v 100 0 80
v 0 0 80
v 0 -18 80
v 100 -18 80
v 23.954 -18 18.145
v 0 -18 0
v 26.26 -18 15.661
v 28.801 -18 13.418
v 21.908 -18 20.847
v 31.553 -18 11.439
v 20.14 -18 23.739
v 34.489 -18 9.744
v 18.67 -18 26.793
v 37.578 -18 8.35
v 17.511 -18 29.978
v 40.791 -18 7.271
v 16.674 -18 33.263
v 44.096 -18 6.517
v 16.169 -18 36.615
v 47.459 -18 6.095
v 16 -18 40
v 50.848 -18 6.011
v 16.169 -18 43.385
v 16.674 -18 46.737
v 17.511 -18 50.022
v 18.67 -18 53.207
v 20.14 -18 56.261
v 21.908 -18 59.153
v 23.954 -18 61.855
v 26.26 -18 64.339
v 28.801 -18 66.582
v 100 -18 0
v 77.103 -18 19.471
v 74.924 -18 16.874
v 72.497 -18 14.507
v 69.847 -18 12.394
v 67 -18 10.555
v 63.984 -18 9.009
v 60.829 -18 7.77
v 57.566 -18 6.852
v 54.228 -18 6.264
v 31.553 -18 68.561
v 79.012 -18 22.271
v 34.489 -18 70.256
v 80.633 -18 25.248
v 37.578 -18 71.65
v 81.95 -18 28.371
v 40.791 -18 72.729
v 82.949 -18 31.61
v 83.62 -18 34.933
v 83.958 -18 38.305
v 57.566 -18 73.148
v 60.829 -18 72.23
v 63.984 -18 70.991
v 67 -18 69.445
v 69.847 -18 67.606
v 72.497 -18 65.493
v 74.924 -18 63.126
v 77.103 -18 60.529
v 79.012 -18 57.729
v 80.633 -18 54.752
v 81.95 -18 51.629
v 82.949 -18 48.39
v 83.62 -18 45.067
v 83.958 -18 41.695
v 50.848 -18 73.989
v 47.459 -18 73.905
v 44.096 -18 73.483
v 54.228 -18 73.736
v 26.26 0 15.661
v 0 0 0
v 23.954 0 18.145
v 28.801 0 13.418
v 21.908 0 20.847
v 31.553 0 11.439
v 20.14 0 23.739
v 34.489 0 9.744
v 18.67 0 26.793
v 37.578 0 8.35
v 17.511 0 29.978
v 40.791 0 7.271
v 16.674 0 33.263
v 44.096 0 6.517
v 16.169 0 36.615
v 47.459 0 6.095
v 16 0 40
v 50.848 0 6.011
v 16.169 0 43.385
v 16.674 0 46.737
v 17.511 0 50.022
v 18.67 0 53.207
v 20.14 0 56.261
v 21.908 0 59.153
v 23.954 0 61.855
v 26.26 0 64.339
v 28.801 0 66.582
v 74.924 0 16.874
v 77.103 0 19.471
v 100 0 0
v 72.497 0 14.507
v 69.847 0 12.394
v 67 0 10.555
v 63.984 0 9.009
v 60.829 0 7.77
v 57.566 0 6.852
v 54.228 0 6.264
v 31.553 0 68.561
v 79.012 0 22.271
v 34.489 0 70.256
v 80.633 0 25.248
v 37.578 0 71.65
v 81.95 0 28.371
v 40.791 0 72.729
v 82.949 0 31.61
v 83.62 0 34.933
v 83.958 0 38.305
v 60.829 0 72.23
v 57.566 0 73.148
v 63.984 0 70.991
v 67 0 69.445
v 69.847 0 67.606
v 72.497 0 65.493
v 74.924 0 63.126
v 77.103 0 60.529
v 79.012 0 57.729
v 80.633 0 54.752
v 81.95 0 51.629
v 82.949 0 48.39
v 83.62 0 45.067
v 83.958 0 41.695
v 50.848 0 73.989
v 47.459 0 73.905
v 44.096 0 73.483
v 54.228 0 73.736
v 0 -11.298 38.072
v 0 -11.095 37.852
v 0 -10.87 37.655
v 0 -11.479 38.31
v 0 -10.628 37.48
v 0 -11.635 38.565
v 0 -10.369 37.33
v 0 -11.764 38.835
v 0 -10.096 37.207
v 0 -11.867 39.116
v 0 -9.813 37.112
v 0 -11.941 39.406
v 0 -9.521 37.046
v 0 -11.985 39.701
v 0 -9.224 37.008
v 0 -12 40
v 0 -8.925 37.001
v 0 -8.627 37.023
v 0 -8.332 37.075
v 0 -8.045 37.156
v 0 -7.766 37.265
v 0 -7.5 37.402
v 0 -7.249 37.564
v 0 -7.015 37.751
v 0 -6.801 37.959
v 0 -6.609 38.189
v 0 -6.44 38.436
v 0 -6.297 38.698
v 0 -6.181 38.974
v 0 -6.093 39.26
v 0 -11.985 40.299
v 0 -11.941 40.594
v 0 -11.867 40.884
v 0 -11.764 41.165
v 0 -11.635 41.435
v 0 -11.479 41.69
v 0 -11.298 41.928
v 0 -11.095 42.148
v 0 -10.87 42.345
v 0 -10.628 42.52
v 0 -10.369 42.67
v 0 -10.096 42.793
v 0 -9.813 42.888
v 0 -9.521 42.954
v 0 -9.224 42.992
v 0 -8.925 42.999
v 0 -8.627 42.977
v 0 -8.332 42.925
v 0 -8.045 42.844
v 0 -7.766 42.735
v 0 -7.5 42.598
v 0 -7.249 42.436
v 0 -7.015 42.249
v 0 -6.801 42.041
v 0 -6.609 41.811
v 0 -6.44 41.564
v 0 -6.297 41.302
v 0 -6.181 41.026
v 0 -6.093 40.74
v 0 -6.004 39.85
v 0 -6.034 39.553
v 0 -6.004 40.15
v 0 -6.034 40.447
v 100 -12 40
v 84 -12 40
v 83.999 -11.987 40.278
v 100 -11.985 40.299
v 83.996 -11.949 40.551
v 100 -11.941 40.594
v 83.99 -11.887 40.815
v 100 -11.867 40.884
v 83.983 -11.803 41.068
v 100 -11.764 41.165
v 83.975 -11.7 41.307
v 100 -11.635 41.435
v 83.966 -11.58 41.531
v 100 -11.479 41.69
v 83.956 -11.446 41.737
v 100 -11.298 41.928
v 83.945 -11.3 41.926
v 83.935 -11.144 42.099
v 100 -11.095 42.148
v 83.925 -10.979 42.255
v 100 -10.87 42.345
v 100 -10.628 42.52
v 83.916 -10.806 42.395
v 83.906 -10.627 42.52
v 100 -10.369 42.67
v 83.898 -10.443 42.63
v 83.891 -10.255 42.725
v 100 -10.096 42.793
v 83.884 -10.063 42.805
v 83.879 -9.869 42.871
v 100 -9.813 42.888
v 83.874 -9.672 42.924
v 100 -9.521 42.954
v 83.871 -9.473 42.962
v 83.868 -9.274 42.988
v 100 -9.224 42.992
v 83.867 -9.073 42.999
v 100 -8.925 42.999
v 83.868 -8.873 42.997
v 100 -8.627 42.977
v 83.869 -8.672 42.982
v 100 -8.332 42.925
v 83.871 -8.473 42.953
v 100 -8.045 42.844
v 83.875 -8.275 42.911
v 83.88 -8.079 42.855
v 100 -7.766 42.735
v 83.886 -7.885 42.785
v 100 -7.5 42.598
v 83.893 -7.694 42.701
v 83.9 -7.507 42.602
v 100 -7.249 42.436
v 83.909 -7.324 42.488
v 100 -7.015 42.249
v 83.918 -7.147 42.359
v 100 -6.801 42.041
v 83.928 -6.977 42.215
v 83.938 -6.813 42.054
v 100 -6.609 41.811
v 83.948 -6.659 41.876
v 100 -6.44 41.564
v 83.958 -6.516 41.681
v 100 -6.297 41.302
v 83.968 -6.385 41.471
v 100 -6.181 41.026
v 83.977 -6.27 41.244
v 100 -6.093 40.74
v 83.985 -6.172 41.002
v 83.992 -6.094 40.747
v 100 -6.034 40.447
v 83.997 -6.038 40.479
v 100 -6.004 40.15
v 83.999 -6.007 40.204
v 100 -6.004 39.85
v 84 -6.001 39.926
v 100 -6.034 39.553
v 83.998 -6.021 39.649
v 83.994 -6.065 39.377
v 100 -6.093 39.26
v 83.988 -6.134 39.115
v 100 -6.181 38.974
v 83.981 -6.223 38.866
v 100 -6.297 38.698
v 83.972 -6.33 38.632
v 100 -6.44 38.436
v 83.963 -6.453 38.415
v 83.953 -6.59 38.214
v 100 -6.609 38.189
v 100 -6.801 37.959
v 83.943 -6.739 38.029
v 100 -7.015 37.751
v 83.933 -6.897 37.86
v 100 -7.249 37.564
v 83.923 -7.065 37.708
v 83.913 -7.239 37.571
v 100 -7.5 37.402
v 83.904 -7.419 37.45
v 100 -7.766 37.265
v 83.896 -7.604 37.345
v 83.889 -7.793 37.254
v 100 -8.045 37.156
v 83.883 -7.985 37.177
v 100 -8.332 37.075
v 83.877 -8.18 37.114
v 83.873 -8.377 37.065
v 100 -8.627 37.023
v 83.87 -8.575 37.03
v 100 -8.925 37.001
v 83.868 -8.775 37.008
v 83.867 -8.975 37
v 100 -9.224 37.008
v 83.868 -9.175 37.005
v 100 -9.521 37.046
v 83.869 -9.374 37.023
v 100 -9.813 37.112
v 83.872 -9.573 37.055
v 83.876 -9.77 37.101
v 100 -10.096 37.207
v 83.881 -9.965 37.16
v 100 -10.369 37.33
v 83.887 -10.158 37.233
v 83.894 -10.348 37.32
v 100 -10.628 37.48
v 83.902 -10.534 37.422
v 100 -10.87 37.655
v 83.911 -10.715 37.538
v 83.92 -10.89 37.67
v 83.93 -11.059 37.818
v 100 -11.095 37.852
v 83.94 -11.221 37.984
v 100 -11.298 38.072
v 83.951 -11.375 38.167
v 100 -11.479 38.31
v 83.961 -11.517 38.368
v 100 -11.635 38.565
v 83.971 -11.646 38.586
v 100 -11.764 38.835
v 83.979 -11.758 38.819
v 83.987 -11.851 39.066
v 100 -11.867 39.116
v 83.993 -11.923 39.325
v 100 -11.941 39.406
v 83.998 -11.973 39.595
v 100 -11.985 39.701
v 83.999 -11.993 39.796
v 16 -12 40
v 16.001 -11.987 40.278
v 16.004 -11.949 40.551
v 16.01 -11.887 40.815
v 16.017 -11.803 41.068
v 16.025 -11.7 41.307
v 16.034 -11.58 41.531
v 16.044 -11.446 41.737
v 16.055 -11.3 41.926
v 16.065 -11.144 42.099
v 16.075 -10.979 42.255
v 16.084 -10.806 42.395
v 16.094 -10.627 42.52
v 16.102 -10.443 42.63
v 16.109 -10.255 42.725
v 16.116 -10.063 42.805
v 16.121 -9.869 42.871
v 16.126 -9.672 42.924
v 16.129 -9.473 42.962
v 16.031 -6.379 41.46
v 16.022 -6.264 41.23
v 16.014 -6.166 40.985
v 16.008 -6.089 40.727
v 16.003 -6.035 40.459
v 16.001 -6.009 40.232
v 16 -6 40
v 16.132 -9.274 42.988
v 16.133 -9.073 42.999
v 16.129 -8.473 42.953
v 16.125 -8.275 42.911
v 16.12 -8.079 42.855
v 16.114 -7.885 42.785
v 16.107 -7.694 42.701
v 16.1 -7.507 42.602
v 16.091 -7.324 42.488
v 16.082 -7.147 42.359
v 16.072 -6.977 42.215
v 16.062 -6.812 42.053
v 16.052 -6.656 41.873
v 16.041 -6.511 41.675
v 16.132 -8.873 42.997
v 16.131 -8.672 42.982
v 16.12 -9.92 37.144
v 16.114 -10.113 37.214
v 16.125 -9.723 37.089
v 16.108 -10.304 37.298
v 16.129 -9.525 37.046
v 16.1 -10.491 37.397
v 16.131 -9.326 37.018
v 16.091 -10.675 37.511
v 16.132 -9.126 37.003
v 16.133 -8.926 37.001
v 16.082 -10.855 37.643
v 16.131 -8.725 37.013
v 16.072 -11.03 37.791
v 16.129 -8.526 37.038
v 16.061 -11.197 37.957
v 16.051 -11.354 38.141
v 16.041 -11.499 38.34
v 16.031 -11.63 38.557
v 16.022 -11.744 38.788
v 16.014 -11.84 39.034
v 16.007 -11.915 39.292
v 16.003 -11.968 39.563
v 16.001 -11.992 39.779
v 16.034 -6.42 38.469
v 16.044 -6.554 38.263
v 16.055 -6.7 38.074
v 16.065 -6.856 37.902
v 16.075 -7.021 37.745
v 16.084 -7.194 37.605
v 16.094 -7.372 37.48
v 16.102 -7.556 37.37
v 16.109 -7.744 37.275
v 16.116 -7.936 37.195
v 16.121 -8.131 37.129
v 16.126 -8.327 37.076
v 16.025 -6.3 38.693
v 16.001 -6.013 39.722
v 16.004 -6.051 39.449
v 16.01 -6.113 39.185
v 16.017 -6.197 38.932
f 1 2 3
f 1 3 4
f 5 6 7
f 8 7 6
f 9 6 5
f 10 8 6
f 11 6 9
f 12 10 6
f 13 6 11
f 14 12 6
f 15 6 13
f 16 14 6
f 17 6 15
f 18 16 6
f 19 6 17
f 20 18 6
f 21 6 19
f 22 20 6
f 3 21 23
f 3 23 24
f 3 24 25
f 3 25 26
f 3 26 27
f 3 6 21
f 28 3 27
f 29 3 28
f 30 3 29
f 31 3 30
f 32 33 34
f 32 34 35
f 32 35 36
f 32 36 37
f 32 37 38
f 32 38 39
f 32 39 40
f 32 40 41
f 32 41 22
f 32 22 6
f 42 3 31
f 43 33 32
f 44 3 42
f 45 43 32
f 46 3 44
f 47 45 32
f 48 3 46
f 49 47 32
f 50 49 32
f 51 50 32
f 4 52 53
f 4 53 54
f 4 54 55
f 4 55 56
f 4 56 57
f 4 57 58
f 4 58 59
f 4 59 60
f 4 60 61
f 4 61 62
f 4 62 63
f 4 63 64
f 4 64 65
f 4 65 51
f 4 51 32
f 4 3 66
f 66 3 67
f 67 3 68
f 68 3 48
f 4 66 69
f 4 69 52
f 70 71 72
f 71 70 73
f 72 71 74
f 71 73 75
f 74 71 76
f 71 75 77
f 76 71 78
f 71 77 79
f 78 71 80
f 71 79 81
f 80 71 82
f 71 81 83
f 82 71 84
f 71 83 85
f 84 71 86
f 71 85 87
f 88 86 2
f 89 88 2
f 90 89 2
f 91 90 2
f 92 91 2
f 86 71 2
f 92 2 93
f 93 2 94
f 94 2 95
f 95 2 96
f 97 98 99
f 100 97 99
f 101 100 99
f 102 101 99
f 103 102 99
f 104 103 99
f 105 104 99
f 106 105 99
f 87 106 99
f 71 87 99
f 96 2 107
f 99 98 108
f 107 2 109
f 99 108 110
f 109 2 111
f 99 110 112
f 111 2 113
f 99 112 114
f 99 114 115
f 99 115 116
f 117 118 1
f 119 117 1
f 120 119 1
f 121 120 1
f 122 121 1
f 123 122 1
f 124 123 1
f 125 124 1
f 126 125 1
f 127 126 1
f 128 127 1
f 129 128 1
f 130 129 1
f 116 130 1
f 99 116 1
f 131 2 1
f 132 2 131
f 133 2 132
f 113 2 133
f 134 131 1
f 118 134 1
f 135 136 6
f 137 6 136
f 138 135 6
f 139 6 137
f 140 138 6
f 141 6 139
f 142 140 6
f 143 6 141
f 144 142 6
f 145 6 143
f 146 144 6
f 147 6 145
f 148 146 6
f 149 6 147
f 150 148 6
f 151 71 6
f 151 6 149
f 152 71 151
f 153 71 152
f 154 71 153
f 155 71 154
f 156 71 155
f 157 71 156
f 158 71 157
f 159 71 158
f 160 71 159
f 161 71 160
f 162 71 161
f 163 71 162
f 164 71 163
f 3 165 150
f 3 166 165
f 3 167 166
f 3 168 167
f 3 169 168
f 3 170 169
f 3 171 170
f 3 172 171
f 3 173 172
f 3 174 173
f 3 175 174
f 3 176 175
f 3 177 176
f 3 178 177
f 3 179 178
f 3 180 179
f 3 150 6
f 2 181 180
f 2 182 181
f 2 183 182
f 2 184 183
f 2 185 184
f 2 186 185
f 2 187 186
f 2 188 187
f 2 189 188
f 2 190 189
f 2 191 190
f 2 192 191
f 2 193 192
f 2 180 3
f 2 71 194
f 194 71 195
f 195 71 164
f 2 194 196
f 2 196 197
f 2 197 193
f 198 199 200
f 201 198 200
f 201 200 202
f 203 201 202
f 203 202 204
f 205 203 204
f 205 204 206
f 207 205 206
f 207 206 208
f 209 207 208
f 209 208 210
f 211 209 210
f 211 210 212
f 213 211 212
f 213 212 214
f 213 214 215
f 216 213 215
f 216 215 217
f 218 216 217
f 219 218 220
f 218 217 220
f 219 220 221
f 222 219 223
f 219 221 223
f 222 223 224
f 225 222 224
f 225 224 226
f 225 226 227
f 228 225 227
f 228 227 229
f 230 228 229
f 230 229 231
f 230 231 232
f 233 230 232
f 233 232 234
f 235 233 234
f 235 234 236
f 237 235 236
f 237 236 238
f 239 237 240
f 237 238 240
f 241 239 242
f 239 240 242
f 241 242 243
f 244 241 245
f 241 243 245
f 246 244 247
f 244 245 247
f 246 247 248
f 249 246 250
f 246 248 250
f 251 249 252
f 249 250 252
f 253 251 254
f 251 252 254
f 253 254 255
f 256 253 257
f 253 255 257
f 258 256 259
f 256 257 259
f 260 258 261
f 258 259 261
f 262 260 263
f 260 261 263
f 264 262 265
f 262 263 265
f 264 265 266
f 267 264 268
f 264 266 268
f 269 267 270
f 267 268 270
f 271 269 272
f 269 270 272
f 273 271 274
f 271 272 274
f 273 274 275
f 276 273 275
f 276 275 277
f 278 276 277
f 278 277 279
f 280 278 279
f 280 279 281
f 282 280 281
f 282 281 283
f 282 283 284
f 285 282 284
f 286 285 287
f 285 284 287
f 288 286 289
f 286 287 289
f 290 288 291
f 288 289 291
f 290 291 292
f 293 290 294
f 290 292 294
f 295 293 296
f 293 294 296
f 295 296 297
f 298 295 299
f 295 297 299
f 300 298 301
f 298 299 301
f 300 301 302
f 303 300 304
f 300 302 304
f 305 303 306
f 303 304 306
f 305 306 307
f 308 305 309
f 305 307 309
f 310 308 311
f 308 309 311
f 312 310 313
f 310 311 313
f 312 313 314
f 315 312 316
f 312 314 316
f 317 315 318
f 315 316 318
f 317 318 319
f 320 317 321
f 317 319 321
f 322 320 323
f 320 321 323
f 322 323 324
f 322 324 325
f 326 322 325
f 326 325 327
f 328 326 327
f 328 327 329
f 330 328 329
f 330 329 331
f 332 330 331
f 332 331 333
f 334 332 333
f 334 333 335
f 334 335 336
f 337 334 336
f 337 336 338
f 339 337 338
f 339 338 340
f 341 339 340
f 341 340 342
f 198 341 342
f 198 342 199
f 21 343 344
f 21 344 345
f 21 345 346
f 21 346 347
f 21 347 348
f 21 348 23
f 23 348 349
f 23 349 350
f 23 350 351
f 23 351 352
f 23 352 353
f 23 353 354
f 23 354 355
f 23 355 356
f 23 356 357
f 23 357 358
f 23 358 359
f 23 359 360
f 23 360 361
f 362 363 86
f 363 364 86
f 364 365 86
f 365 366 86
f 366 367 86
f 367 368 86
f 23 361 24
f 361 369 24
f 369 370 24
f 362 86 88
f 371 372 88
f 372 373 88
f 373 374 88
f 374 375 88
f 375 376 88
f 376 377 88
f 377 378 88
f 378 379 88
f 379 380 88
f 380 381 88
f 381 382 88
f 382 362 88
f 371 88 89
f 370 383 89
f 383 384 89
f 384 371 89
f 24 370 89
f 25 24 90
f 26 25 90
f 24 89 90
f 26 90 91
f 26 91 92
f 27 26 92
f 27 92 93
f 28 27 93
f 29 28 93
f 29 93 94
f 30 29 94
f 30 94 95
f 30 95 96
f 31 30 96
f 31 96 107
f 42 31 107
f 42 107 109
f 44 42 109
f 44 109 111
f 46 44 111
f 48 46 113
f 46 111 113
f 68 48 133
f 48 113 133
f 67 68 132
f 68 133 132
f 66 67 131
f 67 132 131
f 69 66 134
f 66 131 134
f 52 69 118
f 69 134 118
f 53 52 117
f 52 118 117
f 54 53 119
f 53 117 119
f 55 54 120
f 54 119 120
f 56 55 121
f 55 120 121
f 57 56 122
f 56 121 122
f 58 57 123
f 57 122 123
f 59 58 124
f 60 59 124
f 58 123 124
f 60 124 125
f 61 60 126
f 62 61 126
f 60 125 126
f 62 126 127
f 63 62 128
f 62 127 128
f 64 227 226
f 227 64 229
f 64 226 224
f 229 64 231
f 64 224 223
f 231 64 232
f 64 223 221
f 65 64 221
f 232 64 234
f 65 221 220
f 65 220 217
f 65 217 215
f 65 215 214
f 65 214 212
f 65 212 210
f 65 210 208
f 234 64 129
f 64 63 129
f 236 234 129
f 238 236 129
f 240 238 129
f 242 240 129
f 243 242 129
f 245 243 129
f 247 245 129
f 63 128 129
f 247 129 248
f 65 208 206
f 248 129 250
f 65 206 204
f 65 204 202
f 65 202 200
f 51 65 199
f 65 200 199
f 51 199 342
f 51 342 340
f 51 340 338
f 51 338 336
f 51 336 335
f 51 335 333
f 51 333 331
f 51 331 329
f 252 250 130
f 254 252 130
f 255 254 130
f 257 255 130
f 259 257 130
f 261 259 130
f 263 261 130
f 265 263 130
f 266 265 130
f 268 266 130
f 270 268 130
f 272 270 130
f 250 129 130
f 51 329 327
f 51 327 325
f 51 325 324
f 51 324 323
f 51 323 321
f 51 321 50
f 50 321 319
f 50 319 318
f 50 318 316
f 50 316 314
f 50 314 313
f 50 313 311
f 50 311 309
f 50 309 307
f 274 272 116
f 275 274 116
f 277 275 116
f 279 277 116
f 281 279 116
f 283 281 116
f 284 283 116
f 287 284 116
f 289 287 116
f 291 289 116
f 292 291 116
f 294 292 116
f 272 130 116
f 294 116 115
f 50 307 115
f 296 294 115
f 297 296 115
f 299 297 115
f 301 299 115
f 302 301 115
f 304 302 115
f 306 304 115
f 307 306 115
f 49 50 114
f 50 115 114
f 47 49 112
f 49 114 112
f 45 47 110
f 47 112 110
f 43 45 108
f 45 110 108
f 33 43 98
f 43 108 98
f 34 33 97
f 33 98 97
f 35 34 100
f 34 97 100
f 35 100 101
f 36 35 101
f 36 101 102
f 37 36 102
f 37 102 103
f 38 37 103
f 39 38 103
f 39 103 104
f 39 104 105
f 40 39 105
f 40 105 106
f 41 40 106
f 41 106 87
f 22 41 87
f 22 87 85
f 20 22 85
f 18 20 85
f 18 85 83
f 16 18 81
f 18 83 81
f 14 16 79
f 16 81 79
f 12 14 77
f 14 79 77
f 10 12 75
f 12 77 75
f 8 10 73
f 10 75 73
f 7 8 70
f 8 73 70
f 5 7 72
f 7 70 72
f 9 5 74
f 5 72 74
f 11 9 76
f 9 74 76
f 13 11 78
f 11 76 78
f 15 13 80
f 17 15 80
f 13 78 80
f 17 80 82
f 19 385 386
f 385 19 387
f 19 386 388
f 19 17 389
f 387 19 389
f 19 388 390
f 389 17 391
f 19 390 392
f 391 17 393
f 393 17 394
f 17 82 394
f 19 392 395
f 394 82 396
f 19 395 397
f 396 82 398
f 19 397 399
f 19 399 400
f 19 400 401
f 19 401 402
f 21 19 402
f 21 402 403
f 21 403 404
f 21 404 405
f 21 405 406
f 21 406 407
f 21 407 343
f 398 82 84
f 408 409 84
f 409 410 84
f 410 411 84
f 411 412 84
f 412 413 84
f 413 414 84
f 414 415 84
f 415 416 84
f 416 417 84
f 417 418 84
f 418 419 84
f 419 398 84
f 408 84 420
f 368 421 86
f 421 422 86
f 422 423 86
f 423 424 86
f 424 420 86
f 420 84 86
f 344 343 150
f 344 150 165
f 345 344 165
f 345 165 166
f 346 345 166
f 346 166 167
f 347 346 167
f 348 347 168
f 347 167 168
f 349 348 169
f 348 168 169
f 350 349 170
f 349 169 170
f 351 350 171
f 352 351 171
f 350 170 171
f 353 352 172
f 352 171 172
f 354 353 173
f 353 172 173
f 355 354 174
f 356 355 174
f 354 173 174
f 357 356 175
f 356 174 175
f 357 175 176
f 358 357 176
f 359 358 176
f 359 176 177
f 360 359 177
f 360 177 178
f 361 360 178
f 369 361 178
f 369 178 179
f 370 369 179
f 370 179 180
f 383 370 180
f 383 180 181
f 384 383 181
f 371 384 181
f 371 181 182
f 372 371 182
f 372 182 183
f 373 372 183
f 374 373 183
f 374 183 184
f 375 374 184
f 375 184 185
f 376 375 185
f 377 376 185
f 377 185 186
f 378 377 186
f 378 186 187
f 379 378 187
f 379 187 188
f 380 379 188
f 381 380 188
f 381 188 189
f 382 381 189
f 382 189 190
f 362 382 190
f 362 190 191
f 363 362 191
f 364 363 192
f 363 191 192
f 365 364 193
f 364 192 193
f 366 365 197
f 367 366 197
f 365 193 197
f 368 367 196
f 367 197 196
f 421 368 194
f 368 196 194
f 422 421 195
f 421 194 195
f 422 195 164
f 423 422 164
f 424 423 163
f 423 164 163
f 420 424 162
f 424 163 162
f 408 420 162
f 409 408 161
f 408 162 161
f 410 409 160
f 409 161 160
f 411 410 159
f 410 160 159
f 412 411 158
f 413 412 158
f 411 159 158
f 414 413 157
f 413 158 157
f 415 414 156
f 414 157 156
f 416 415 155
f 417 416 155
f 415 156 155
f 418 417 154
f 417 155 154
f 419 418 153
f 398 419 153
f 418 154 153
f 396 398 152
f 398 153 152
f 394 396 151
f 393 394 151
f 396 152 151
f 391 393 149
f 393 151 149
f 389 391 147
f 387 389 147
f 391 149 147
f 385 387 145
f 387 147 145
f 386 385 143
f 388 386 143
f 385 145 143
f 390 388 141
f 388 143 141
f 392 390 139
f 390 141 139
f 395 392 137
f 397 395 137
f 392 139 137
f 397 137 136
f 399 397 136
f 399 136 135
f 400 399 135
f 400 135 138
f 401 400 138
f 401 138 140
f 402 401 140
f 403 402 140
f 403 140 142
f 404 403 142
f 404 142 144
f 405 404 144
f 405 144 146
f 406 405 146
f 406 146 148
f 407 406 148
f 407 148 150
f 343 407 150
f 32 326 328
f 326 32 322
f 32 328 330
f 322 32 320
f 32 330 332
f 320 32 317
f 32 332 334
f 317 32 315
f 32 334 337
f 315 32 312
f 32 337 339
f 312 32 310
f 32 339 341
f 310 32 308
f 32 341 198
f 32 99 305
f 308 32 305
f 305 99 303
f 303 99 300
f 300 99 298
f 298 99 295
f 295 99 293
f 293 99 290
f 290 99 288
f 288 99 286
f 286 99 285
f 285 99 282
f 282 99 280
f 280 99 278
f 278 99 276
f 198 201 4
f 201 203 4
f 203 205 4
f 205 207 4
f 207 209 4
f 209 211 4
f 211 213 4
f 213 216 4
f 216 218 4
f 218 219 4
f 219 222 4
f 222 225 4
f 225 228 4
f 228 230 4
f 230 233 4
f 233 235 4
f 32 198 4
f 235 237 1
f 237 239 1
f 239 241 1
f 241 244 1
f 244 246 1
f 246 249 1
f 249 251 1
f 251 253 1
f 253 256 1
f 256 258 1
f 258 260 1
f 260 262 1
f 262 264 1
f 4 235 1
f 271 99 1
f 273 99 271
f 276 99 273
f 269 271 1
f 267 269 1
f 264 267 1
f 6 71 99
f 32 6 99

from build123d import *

# Parameters (mm, degrees)
F0_W     = 100
F0_H     = 80
F1_DEPTH = 18
F3_D     = 68
F5_D     = 6


with BuildPart() as f1:
    # F0 (on Front) → F1 (new body)
    with BuildSketch(Plane.XZ):
        with Locations((50, 40)):
            Rectangle(F0_W, F0_H)
    extrude(amount=F1_DEPTH)

    # F3 (through all)
    with Locations(Plane.XZ.offset(18)):
        with Locations((50, 40)):
            Hole(F3_D / 2)

    # F5 (through all)
    with Locations(Plane.YZ.offset(100)):
        with Locations((-9, 40)):
            Hole(F5_D / 2)


solid = f1.part
